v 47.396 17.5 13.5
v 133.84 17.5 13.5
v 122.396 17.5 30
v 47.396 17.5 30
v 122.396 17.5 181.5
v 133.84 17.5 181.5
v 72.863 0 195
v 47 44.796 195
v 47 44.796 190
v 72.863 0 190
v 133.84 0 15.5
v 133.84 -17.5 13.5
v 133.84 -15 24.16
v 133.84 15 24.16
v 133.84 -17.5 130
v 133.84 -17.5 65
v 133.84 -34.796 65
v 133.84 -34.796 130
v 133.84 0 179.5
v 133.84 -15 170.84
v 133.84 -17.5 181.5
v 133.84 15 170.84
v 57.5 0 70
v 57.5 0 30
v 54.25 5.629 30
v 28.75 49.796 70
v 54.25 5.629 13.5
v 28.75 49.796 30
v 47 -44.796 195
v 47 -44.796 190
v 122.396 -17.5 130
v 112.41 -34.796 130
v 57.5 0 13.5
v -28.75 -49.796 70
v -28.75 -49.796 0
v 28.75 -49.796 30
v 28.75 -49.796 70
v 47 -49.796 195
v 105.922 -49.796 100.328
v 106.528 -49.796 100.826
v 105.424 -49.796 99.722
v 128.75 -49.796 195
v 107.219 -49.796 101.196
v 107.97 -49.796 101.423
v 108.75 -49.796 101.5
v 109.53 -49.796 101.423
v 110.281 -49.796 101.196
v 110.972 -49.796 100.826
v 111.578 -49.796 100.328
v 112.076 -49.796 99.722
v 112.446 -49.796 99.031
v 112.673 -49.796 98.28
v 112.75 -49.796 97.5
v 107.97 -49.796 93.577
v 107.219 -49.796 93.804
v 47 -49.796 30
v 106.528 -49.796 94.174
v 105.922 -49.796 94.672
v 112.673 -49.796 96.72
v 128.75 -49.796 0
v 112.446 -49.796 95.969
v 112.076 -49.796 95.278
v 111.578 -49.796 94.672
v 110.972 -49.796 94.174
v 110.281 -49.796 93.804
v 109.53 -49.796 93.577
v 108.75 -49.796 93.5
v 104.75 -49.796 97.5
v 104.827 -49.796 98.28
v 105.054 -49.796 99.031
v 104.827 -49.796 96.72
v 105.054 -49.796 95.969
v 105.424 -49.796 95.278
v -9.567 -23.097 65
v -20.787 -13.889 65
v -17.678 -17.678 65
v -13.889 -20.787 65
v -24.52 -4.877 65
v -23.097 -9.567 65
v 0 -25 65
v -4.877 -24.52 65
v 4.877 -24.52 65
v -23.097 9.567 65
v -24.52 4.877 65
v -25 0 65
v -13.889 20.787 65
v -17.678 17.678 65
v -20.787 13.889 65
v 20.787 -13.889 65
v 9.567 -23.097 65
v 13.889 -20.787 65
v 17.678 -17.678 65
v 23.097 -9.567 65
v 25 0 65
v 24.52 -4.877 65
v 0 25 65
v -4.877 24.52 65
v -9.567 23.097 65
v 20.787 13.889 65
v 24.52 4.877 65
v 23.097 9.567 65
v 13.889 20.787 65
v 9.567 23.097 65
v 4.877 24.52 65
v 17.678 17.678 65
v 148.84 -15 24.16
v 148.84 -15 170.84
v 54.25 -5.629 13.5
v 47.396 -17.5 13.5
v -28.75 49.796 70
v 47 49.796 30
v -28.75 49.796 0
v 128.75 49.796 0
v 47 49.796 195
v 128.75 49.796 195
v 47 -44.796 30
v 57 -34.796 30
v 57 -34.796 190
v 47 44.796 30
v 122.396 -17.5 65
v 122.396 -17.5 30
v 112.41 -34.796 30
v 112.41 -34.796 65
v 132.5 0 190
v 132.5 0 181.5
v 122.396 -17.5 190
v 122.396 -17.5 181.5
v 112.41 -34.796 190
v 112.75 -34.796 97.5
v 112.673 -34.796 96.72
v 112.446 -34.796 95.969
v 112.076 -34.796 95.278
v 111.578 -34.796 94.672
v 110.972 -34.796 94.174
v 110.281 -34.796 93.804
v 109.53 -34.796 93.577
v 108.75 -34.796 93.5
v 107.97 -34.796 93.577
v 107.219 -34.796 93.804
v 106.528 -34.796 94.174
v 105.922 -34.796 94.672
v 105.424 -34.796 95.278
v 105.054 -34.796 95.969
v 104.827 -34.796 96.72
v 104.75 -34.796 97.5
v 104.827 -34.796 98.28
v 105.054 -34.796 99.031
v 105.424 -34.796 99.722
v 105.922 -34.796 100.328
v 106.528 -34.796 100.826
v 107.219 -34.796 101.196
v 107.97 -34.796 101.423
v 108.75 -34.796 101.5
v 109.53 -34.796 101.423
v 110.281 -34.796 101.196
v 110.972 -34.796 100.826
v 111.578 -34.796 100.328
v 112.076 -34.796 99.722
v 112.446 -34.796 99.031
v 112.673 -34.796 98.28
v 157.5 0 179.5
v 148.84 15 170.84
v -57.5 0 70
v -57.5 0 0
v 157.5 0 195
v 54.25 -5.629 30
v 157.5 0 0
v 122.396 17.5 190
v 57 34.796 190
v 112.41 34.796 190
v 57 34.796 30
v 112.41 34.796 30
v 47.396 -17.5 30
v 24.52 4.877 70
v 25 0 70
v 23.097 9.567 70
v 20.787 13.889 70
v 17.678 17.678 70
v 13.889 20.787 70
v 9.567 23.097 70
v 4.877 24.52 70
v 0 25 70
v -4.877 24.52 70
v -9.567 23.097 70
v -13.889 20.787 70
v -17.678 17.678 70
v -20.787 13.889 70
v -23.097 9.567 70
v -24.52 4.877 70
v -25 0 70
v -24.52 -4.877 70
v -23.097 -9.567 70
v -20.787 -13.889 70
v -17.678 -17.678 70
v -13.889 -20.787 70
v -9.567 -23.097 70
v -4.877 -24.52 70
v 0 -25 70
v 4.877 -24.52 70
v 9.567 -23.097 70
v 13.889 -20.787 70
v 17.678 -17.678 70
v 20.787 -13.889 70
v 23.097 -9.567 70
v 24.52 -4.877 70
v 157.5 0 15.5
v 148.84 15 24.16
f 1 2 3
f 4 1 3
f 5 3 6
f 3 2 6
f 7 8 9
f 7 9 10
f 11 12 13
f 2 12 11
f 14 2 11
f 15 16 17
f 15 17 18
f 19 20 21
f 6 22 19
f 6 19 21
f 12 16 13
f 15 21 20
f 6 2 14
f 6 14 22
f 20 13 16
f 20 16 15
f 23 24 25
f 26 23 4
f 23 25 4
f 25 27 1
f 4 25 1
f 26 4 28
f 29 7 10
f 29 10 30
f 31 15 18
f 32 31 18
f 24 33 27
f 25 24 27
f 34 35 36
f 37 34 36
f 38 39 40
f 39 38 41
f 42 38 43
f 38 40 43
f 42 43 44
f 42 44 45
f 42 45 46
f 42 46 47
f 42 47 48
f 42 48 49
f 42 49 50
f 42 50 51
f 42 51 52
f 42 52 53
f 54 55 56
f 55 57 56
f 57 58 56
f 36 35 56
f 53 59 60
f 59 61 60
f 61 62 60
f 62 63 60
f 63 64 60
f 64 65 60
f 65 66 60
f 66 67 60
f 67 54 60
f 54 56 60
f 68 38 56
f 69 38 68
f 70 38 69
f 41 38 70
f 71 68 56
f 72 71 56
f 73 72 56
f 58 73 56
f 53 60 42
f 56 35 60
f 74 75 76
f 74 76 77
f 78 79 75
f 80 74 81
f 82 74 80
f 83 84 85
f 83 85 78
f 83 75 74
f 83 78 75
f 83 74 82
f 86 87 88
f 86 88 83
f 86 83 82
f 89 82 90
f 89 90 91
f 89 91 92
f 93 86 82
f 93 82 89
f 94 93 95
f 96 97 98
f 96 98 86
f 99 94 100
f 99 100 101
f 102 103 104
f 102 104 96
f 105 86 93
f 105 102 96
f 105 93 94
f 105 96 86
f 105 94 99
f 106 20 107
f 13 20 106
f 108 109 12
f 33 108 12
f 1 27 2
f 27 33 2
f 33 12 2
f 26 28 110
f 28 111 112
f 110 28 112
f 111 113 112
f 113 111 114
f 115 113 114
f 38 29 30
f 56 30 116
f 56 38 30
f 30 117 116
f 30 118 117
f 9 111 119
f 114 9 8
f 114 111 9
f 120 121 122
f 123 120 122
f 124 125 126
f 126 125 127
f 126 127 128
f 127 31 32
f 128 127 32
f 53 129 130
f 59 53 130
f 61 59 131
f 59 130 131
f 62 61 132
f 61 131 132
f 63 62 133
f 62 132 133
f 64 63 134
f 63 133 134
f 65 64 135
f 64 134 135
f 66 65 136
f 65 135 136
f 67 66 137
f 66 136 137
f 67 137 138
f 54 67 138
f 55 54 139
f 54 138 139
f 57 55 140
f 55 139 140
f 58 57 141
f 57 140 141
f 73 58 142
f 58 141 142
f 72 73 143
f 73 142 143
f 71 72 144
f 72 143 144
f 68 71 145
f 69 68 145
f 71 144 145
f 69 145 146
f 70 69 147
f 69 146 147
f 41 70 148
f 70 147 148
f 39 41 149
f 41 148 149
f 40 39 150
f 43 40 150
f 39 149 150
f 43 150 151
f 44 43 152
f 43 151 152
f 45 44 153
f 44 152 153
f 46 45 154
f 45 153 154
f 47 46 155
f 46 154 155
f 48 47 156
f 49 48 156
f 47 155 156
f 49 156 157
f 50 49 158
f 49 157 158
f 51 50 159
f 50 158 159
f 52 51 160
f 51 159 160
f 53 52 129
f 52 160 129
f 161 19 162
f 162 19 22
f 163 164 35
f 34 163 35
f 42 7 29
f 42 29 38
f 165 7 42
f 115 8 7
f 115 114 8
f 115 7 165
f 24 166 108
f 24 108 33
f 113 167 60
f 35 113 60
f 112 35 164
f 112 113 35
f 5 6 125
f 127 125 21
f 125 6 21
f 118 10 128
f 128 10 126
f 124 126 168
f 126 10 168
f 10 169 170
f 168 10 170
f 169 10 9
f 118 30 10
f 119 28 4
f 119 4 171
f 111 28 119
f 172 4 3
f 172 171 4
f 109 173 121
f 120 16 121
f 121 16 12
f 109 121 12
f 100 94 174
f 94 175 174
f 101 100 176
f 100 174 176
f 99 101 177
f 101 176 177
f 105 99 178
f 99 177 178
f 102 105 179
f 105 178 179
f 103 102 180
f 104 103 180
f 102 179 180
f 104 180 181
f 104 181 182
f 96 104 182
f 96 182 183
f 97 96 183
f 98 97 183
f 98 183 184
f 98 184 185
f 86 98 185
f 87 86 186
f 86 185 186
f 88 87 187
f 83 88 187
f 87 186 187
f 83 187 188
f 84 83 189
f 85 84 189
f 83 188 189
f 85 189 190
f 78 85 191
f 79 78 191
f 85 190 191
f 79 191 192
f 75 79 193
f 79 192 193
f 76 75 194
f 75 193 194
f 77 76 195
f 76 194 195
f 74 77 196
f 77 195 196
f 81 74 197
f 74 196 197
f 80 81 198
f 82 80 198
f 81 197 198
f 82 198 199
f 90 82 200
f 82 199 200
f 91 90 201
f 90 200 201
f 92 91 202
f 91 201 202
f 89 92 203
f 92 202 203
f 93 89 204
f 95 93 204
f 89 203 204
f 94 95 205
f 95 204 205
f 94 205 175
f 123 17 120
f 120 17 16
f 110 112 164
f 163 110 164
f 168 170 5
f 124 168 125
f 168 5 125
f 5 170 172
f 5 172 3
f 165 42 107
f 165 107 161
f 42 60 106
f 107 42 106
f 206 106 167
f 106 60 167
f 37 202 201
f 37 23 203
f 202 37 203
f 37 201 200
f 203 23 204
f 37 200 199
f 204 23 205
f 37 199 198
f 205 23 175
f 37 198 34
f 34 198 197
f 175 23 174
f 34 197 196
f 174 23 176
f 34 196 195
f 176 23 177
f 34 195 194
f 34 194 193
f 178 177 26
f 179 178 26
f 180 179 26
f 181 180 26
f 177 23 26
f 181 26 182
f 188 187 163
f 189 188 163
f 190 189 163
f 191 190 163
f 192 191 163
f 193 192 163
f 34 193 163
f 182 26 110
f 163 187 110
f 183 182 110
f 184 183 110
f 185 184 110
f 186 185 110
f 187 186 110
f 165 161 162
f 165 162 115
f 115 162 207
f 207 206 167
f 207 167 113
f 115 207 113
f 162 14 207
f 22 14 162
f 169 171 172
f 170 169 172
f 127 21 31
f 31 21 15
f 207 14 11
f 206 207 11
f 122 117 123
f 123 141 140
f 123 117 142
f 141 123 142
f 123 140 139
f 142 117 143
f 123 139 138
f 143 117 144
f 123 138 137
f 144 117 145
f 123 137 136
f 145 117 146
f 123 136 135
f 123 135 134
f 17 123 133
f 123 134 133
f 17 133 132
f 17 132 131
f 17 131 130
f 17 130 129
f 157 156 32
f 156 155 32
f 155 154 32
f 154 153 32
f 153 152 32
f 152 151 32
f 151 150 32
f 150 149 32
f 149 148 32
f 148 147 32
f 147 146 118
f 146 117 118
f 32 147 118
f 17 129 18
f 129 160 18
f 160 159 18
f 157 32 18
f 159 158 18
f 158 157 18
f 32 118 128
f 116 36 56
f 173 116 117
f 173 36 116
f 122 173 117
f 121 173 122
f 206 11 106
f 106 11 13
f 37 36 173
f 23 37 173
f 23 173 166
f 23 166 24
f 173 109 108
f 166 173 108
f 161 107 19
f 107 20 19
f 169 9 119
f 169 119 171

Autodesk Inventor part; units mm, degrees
ref_plane "YZ Plane" through (0, 0, 0) normal (1, 0, 0) x (0, 1, 0)
ref_plane "XZ Plane" through (0, 0, 0) normal (0, 1, 0) x (-1, 0, 0)
ref_plane "XY Plane" through (0, 0, 0) normal (0, 0, 1) x (1, 0, 0)
sketch "Sketch7" plane through (0, 0, 0) normal (0, 0, 1) x (1, 0, 0)
  line L0 (-57.5, 0) -> (-28.75, 49.7965)
  line L1 (-28.75, 49.7965) -> (28.75, 49.7965)
  line L2 (28.75, 49.7965) -> (57.5, 0)
  line L3 (57.5, 0) -> (28.75, -49.7965)
  line L4 (28.75, -49.7965) -> (-28.75, -49.7965)
  line L5 (-28.75, -49.7965) -> (-57.5, 0)
  circle A0 centre (0, 0) radius 22.5
  circle A1 centre (-51, 0) radius 2.5
  circle A2 centre (-25.5, -44.1673) radius 2.5
  circle A3 centre (25.5, -44.1673) radius 2.5
  circle A4 centre (51, 0) radius 2.5
  circle A5 centre (25.5, 44.1673) radius 2.5
  circle A6 centre (-25.5, 44.1673) radius 2.5
  line L6 (28.75, 49.7965) -> (157.5, 49.7965)
  line L7 (157.5, 49.7965) -> (157.5, -49.7965)
  line L8 (157.5, -49.7965) -> (28.75, -49.7965)
  dimension "d34" = 115
  dimension "d35" = 45
  dimension "d36" = 5
  dimension "d37" = 51
  dimension "d40" = 360
  dimension "d42" = 100
extrude "Extrusion7" add sketch "Sketch7" along normal blind 30
sketch "Sketch9" plane through (0, 0, 30) normal (0, 0, 1) x (1, 0, 0)
  line L0 (157.5, -49.7965) -> (157.5, 49.7965) projected
  line L1 (157.5, 0) -> (128.75, -49.7965)
  line L2 (128.75, -49.7965) -> (71.25, -49.7965)
  line L3 (71.25, -49.7965) -> (42.5, 0)
  line L4 (42.5, 0) -> (71.25, 49.7965)
  line L5 (71.25, 49.7965) -> (128.75, 49.7965)
  line L6 (128.75, 49.7965) -> (157.5, 0)
  line L7 (157.5, 49.7965) -> (-28.75, 49.7965) projected
  line L8 (-28.75, -49.7965) -> (157.5, -49.7965) projected
  line L9 (128.75, 49.7965) -> (157.5, 49.7965)
  line L10 (157.5, 49.7965) -> (157.5, 0)
  line L11 (157.5, 0) -> (157.5, -49.7965)
  line L12 (157.5, -49.7965) -> (128.75, -49.7965)
  point P0 (0, 0)
  point P1 (100, 0)
  point P2 (100, 49.7965)
  point P3 (100, -49.7965)
extrude "Extrusion8" cut sketch "Sketch9" against normal through all contours L8 L1 L0 | L6 L7 L0
sketch "Sketch10" plane through (0, 0, 30) normal (0, 0, 1) x (1, 0, 0)
  line L0 (157.5, 0) -> (128.75, 49.7965) projected
  line L1 (128.75, -49.7965) -> (157.5, 0) projected
  line L2 (-28.75, -49.7965) -> (128.75, -49.7965) projected
  line L3 (128.75, 49.7965) -> (-28.75, 49.7965) projected
  line L4 (128.75, 49.7965) -> (103.75, 49.7965)
  line L5 (128.75, 49.7965) -> (-28.75, 49.7965) projected
  line L6 (103.75, 49.7965) -> (132.5, 0)
  line L7 (132.5, 0) -> (103.75, -49.7965)
  line L8 (103.75, -49.7965) -> (128.75, -49.7965)
  point P0 (0, 0)
  dimension "d47" = 25
extrude "Extrusion9" add sketch "Sketch10" along normal blind 165
sketch "Sketch11" plane through (0, 0, 0) normal (1, 0, 0) x (0, 1, 0)
  line L0 (15, 179.5) -> (-15, 179.5)
  line L1 (-15, 179.5) -> (-15, 15.5)
  line L2 (-15, 15.5) -> (15, 15.5)
  line L3 (15, 15.5) -> (15, 179.5)
  line L4 (49.7965, 195) -> (49.7965, 0) projected
  line L5 (0, 179.5) -> (15, 170.8397)
  line L6 (15, 170.8397) -> (15, 153.5192)
  line L7 (15, 153.5192) -> (0, 144.859)
  line L8 (0, 144.859) -> (-15, 153.5192)
  line L9 (-15, 153.5192) -> (-15, 170.8397)
  line L10 (-15, 170.8397) -> (0, 179.5)
  line L11 (0, 15.5) -> (-15, 24.1603)
  line L12 (-15, 24.1603) -> (-15, 41.4808)
  line L13 (-15, 41.4808) -> (0, 50.141)
  line L14 (0, 50.141) -> (15, 41.4808)
  line L15 (15, 41.4808) -> (15, 24.1603)
  line L16 (15, 24.1603) -> (0, 15.5)
  line L17 (0, 179.5) -> (15, 179.5)
  line L18 (15, 179.5) -> (15, 170.8397)
  line L19 (0, 179.5) -> (-15, 179.5)
  line L20 (-15, 179.5) -> (-15, 170.8397)
  line L21 (-15, 24.1603) -> (-15, 15.5)
  line L22 (15, 15.5) -> (15, 24.1603)
  line L23 (0, 15.5) -> (15, 15.5)
  point P0 (0, 0)
  point P1 (15, 97.5)
  point P2 (49.7965, 97.5)
  point P3 (0, 195)
  point P4 (0, 162.1795)
  point P5 (0, 32.8205)
  dimension "d50" = 164
  dimension "d51" = 30
extrude "Extrusion10" cut sketch "Sketch11" along normal through all contours L5 L3 L7 L8 L1 L10 | L3 L14 L13 L1 L8 L7 | L3 L16 L11 L1 L13 L14
sketch "Sketch12" plane through (-28.75, -49.7965, 0) normal (0, -1, 0) x (1, 0, 0)
  line L0 (157.5, 72.5) -> (97.5, 72.5)
  line L1 (97.5, 72.5) -> (97.5, 122.5)
  line L2 (97.5, 122.5) -> (157.5, 122.5)
  line L3 (157.5, 122.5) -> (157.5, 72.5)
  line L4 (177.5897, 24.1603) -> (177.5897, 170.8397) projected
  line L5 (157.5, 0) -> (157.5, 195) projected
  point P0 (28.75, 0)
  point P1 (177.5897, 97.5)
  point P2 (157.5, 97.5)
  dimension "d54" = 60
  dimension "d55" = 50
extrude "Extrusion11" add sketch "Sketch12" against normal blind 15
sketch "Sketch13" plane through (-28.75, -34.7965, 0) normal (0, 1, 0) x (1, 0, 0)
  circle A0 centre (137.5, -97.5) radius 4
  line L0 (97.5, -72.5) -> (97.5, -122.5) projected
  line L1 (132.5, -30) -> (132.5, -195) projected
  point P0 (28.75, 0)
  point P1 (97.5, -97.5)
  dimension "d58" = 8
  dimension "d69" = 5
extrude "Extrusion12" cut sketch "Sketch13" against normal through all
sketch "Sketch14" plane through (-28.75, -34.7965, 0) normal (0, 1, 0) x (1, 0, 0)
  arc A0 (141.1603, -95.8868) -> (141.1603, -99.1132) centre (137.5, -97.5) ccw projected
  line L0 (141.1603, -72.5) -> (141.1603, -95.8868) projected
  line L1 (141.1603, -72.5) -> (97.5, -72.5) projected
  line L2 (97.5, -72.5) -> (97.5, -122.5) projected
  line L3 (97.5, -122.5) -> (141.1603, -122.5) projected
  line L4 (141.1603, -72.5) -> (162.5897, -72.5)
  line L5 (162.5897, -72.5) -> (162.5897, -122.5)
  line L6 (162.5897, -122.5) -> (141.1603, -122.5)
  line L7 (141.1603, -122.5) -> (141.1603, -72.5)
  line L8 (177.5897, -170.8397) -> (177.5897, -24.1603) projected
  line L9 (141.1603, -99.1132) -> (141.1603, -122.5) projected
  point P0 (28.75, 0)
  dimension "d62" = 15
extrude "Extrusion13" cut sketch "Sketch14" along normal blind 30 contours L0 L4 L5 L6 L7
sketch "Sketch15" plane through (133.8397, -34.7965, 72.5) normal (-1, 0, 0) x (0, 0, 1)
  line L0 (-59, 52.2965) -> (109, 52.2965)
  line L1 (109, 52.2965) -> (109, 17.2965)
  line L2 (109, 17.2965) -> (-59, 17.2965)
  line L3 (-59, 17.2965) -> (-59, 52.2965)
  line L4 (98.3397, 49.7965) -> (-48.3397, 49.7965) projected
  point P0 (-72.5, 34.7965)
  point P1 (-57, 34.7965)
  point P2 (-59, 34.7965)
  point P3 (25, 49.7965)
  point P4 (25, 52.2965)
  dimension "d65" = 168
  dimension "d66" = 35
extrude "Extrusion14" cut sketch "Sketch15" along normal blind 125
sketch "Sketch17" plane through (-28.75, 49.7965, 30) normal (0, 1, 0) x (1, 0, 0)
  line L0 (132.5, -165) -> (157.5, -165) projected
  line L1 (0.75, 30) -> (5.75, 30) projected
  line L2 (157.5, -165) -> (0.75, -165)
  line L3 (0.75, -165) -> (0.75, 30)
  line L4 (0.75, 30) -> (157.5, 30)
  line L5 (157.5, 30) -> (157.5, -165)
  point P0 (28.75, 30)
extrude "Extrusion15" add sketch "Sketch17" against normal blind 15
sketch "Sketch18" plane through (103.75, -49.7965, 72.5) normal (0, 0, -1) x (-1, 0, 0)
  line L0 (0, 0) -> (-8.6603, 15) projected
  line L1 (0, 0) -> (35, 0) projected
  line L2 (35, 0) -> (35, 15) projected
  line L3 (-8.6603, 15) -> (35, 15) projected
  point P0 (103.75, 49.7965)
extrude "Extrusion16" add sketch "Sketch18" along normal blind 50
sketch "Sketch20" plane through (-28.75, 49.7965, 30) normal (0, 1, 0) x (1, 0, 0)
  line L0 (5.75, 0) -> (0.75, 0) projected
  line L1 (141.1603, -165) -> (0.75, -165) projected
  line L2 (0.75, 0) -> (75.75, 0)
  line L3 (75.75, 0) -> (75.75, -165)
  line L4 (75.75, -165) -> (0.75, -165)
  line L5 (0.75, -165) -> (0.75, 0)
  line L6 (157.5, -165) -> (0.75, -165) projected
  point P0 (28.75, 30)
  dimension "d76" = 75
extrude "Extrusion18" cut sketch "Sketch20" against normal through all
chamfer "Chamfer1" distance 10 angle 45 1 edges at (47, 34.7965, 112.5)
sketch "Sketch22" plane through (-28.75, -49.7965, 0) normal (0, -1, 0) x (1, 0, 0)
  line L0 (75.75, 195) -> (75.75, 30) projected
  line L1 (157.5, 195) -> (75.75, 195) projected
  line L2 (0, 0) -> (157.5, 0) projected
  line L3 (75.75, 195) -> (157.5, 195)
  line L4 (157.5, 195) -> (157.5, 0)
  line L5 (157.5, 0) -> (75.75, 0)
  line L6 (75.75, 0) -> (75.75, 195)
  circle A0 centre (137.5, 97.5) radius 4 projected
  point P0 (28.75, 0)
extrude "Extrusion19" add sketch "Sketch22" against normal blind 15
chamfer "Chamfer2" distance 10 angle 45 1 edges at (47, -34.7965, 112.5)
sketch "Sketch32" plane through (0, 0, 0) normal (0, 0, -1) x (-1, 0, 0)
  circle A0 centre (0, 0) radius 22.5 projected
  circle A1 centre (25.5, -44.1673) radius 2.5 projected
  circle A2 centre (25.5, -44.1673) radius 2.5
  circle A3 centre (51, 0) radius 2.5
  circle A4 centre (25.5, 44.1673) radius 2.5
  circle A5 centre (-25.5, 44.1673) radius 2.5
  circle A6 centre (-51, 0) radius 2.5
  circle A7 centre (-25.5, -44.1673) radius 2.5
  dimension "d107" = 360
extrude "Extrusion27" add sketch "Sketch32" against normal blind 5 contours A0
extrude "Extrusion28" cut sketch "Sketch32" against normal through all contours A1 | A3 | A4 | A5 | A6 | A7
sketch "Sketch33" plane through (0, 0, 195) normal (0, 0, 1) x (1, 0, 0)
  line L0 (47, -44.7965) -> (57, -34.7965) projected
  line L1 (57, 34.7965) -> (47, 44.7965) projected
  line L2 (57, 34.7965) -> (63.8655, 27.931)
  line L3 (63.8655, 27.931) -> (91.7965, 0)
  line L4 (57, -34.7965) -> (47, -44.7965) projected
  line L5 (91.7965, 0) -> (57, -34.7965)
  line L6 (57, -34.7965) -> (112.4103, -34.7965) projected
  line L7 (122.3964, 17.5) -> (132.5, 0) projected
  line L8 (132.5, 0) -> (122.3964, -17.5) projected
  line L9 (112.4103, 34.7965) -> (57, 34.7965) projected
  line L10 (133.8397, -34.7965) -> (112.4103, -34.7965) projected
  line L11 (57, -34.7965) -> (112.4103, -34.7965)
  line L12 (122.3964, 17.5) -> (112.4103, 34.7965) projected
  line L13 (47, 44.7965) -> (57, 34.7965) projected
  line L14 (112.4103, 34.7965) -> (57, 34.7965)
  line L15 (132.5, 0) -> (112.4103, 34.7965)
  line L16 (132.5, 0) -> (112.4103, -34.7965)
extrude "Extrusion29" add sketch "Sketch33" against normal blind 5
sketch "Sketch34" plane through (0, 0, 195) normal (0, 0, 1) x (1, 0, 0)
  line L0 (72.8632, 0) -> (47, -44.7965)
  line L1 (47, -44.7965) -> (-4.7265, -44.7965)
  line L2 (-4.7265, -44.7965) -> (-30.5897, 0)
  line L3 (-30.5897, 0) -> (-4.7265, 44.7965)
  line L4 (-4.7265, 44.7965) -> (47, 44.7965)
  line L5 (47, 44.7965) -> (72.8632, 0)
  line L6 (47, -49.7965) -> (47, -44.7965) projected
  line L7 (47, 49.7965) -> (47, 44.7965) projected
  line L8 (91.7965, 0) -> (47, 44.7965) projected
  line L9 (47, -44.7965) -> (91.7965, 0) projected
  point P0 (0, 0)
  point P1 (21.1368, 0)
extrude "Extrusion30" add sketch "Sketch34" against normal blind 5 contours L5 L8 L9 L0
sketch "Sketch35" plane through (0, 0, 0) normal (0, 0, -1) x (-1, 0, 0)
  circle A0 centre (0, 0) radius 22.5 construction
  circle A1 centre (51, 0) radius 2.5 construction
  circle A2 centre (51, 0) radius 6.5
  circle A3 centre (25.5, 44.1673) radius 6.5
  circle A4 centre (-25.5, 44.1673) radius 6.5
  circle A5 centre (-51, 0) radius 6.5
  circle A6 centre (-25.5, -44.1673) radius 6.5
  circle A7 centre (25.5, -44.1673) radius 6.5
  dimension "d117" = 13
  dimension "d120" = 360
extrude "Extrusion31" cut sketch "Sketch35" against normal blind 15
sketch "Sketch36" plane through (0, 0, 195) normal (0, 0, 1) x (1, 0, 0)
  line L0 (77.8632, 9) -> (87.8632, 9)
  line L1 (87.8632, 9) -> (87.8632, -9)
  line L2 (87.8632, -9) -> (77.8632, -9)
  line L3 (77.8632, -9) -> (77.8632, 9)
  point P0 (0, 0)
  point P1 (72.8632, 0)
  point P2 (77.8632, 0)
  dimension "d124" = 10
  dimension "d125" = 18
  dimension "d129" = 5
extrude "Extrusion32" cut sketch "Sketch36" against normal blind 10
sketch "Sketch37" plane through (133.8397, -34.7965, 72.5) normal (-1, 0, 0) x (0, 0, 1)
  line L0 (-7.5, 19.7965) -> (57.5, 19.7965)
  line L1 (57.5, 19.7965) -> (57.5, 0)
  line L2 (57.5, 0) -> (-7.5, 0)
  line L3 (-7.5, 0) -> (-7.5, 19.7965)
  line L4 (21, 0) -> (29, 0) projected
  line L5 (-48.3397, 19.7965) -> (98.3397, 19.7965) projected
  point P0 (-72.5, 34.7965)
  point P1 (25, 0)
  dimension "d130" = 65
extrude "Extrusion33" cut sketch "Sketch37" along normal through all
sketch "Sketch38" plane through (0, 0, 195) normal (0, 0, 1) x (1, 0, 0)
  line L0 (77.8632, -9) -> (77.8632, 9) projected
  line L1 (87.8632, 9) -> (87.8632, -9) projected
  line L2 (77.8632, 9) -> (87.8632, 9) projected
  line L3 (87.8632, -9) -> (77.8632, -9) projected
  point P0 (0, 0)
extrude "Extrusion34" add sketch "Sketch38" against normal blind 5
sketch "Sketch40" plane through (0, 0, 0) normal (0, 0, -1) x (-1, 0, 0)
  line L0 (57.5, 0) -> (28.75, -49.7965) projected
  line L1 (57.5, 0) -> (28.75, -49.7965)
  line L2 (28.75, -49.7965) -> (-28.75, -49.7965)
  line L3 (-28.75, -49.7965) -> (-57.5, 0)
  line L4 (-57.5, 0) -> (-28.75, 49.7965)
  line L5 (-28.75, 49.7965) -> (28.75, 49.7965)
  line L6 (28.75, 49.7965) -> (57.5, 0)
  point P0 (0, 0)
  point P1 (0, 0)
extrude "Extrusion35" add sketch "Sketch40" against normal blind 70
sketch "Sketch42" plane through (0, 0, 0) normal (0, 0, -1) x (-1, 0, 0)
  arc A0 (-28.75, 49.7965) -> (-32, 44.1673) centre (-25.5, 44.1673) ccw projected
  line L0 (-32, 44.1673) -> (-28.75, 49.7965) projected
  arc A1 (-28.75, 49.7965) -> (-32, 44.1673) centre (-25.5, 44.1673) ccw projected
  line L1 (-128.75, 49.7965) -> (-28.75, 49.7965) construction
  line L2 (-128.75, 49.7965) -> (-157.5, 0) projected
  line L3 (-157.5, 0) -> (-128.75, -49.7965) projected
  line L4 (-28.75, -49.7965) -> (-128.75, -49.7965) projected
  arc A2 (-32, -44.1673) -> (-28.75, -49.7965) centre (-25.5, -44.1673) ccw projected
  line L5 (-28.75, -49.7965) -> (-32, -44.1673) projected
  line L6 (28.75, -49.7965) -> (-28.75, -49.7965) projected
  line L7 (57.5, 0) -> (28.75, -49.7965) projected
  line L8 (28.75, 49.7965) -> (57.5, 0) projected
  line L9 (-28.75, 49.7965) -> (28.75, 49.7965) projected
  line L10 (-32, 44.1673) -> (-28.75, 49.7965) projected
  line L11 (-57.5, 0) -> (-54.25, 5.6292) projected
  line L12 (-54.25, -5.6292) -> (-57.5, 0) projected
  arc A3 (-57.5, 0) -> (-54.25, -5.6292) centre (-51, 0) ccw projected
  arc A4 (-54.25, 5.6292) -> (-57.5, 0) centre (-51, 0) ccw projected
  point P0 (0, 0)
extrude "Extrusion37" add sketch "Sketch42" against normal blind 30
sketch "Sketch43" plane through (133.8397, -17.5, 13.5) normal (0, 0, 1) x (1, 0, 0)
  line L0 (-76.3397, 17.5) -> (-79.5897, 23.1292) projected
  arc A0 (-76.3397, 17.5) -> (-79.5897, 23.1292) centre (-82.8397, 17.5) ccw projected
  line L1 (-76.3397, 17.5) -> (-79.5897, 23.1292) projected
  arc A1 (-79.5897, 11.8708) -> (-76.3397, 17.5) centre (-82.8397, 17.5) ccw projected
  line L2 (-79.5897, 11.8708) -> (-76.3397, 17.5) projected
  point P0 (-133.8397, 17.5)
extrude "Extrusion38" cut sketch "Sketch43" along normal through all
sketch "Sketch44" plane through (0, 0, 70) normal (0, 0, 1) x (1, 0, 0)
  circle A0 centre (0, 0) radius 25
  dimension "d143" = 50
extrude "Extrusion39" cut sketch "Sketch44" against normal blind 5
properties part number "HA08" material "ABS Plastic"
